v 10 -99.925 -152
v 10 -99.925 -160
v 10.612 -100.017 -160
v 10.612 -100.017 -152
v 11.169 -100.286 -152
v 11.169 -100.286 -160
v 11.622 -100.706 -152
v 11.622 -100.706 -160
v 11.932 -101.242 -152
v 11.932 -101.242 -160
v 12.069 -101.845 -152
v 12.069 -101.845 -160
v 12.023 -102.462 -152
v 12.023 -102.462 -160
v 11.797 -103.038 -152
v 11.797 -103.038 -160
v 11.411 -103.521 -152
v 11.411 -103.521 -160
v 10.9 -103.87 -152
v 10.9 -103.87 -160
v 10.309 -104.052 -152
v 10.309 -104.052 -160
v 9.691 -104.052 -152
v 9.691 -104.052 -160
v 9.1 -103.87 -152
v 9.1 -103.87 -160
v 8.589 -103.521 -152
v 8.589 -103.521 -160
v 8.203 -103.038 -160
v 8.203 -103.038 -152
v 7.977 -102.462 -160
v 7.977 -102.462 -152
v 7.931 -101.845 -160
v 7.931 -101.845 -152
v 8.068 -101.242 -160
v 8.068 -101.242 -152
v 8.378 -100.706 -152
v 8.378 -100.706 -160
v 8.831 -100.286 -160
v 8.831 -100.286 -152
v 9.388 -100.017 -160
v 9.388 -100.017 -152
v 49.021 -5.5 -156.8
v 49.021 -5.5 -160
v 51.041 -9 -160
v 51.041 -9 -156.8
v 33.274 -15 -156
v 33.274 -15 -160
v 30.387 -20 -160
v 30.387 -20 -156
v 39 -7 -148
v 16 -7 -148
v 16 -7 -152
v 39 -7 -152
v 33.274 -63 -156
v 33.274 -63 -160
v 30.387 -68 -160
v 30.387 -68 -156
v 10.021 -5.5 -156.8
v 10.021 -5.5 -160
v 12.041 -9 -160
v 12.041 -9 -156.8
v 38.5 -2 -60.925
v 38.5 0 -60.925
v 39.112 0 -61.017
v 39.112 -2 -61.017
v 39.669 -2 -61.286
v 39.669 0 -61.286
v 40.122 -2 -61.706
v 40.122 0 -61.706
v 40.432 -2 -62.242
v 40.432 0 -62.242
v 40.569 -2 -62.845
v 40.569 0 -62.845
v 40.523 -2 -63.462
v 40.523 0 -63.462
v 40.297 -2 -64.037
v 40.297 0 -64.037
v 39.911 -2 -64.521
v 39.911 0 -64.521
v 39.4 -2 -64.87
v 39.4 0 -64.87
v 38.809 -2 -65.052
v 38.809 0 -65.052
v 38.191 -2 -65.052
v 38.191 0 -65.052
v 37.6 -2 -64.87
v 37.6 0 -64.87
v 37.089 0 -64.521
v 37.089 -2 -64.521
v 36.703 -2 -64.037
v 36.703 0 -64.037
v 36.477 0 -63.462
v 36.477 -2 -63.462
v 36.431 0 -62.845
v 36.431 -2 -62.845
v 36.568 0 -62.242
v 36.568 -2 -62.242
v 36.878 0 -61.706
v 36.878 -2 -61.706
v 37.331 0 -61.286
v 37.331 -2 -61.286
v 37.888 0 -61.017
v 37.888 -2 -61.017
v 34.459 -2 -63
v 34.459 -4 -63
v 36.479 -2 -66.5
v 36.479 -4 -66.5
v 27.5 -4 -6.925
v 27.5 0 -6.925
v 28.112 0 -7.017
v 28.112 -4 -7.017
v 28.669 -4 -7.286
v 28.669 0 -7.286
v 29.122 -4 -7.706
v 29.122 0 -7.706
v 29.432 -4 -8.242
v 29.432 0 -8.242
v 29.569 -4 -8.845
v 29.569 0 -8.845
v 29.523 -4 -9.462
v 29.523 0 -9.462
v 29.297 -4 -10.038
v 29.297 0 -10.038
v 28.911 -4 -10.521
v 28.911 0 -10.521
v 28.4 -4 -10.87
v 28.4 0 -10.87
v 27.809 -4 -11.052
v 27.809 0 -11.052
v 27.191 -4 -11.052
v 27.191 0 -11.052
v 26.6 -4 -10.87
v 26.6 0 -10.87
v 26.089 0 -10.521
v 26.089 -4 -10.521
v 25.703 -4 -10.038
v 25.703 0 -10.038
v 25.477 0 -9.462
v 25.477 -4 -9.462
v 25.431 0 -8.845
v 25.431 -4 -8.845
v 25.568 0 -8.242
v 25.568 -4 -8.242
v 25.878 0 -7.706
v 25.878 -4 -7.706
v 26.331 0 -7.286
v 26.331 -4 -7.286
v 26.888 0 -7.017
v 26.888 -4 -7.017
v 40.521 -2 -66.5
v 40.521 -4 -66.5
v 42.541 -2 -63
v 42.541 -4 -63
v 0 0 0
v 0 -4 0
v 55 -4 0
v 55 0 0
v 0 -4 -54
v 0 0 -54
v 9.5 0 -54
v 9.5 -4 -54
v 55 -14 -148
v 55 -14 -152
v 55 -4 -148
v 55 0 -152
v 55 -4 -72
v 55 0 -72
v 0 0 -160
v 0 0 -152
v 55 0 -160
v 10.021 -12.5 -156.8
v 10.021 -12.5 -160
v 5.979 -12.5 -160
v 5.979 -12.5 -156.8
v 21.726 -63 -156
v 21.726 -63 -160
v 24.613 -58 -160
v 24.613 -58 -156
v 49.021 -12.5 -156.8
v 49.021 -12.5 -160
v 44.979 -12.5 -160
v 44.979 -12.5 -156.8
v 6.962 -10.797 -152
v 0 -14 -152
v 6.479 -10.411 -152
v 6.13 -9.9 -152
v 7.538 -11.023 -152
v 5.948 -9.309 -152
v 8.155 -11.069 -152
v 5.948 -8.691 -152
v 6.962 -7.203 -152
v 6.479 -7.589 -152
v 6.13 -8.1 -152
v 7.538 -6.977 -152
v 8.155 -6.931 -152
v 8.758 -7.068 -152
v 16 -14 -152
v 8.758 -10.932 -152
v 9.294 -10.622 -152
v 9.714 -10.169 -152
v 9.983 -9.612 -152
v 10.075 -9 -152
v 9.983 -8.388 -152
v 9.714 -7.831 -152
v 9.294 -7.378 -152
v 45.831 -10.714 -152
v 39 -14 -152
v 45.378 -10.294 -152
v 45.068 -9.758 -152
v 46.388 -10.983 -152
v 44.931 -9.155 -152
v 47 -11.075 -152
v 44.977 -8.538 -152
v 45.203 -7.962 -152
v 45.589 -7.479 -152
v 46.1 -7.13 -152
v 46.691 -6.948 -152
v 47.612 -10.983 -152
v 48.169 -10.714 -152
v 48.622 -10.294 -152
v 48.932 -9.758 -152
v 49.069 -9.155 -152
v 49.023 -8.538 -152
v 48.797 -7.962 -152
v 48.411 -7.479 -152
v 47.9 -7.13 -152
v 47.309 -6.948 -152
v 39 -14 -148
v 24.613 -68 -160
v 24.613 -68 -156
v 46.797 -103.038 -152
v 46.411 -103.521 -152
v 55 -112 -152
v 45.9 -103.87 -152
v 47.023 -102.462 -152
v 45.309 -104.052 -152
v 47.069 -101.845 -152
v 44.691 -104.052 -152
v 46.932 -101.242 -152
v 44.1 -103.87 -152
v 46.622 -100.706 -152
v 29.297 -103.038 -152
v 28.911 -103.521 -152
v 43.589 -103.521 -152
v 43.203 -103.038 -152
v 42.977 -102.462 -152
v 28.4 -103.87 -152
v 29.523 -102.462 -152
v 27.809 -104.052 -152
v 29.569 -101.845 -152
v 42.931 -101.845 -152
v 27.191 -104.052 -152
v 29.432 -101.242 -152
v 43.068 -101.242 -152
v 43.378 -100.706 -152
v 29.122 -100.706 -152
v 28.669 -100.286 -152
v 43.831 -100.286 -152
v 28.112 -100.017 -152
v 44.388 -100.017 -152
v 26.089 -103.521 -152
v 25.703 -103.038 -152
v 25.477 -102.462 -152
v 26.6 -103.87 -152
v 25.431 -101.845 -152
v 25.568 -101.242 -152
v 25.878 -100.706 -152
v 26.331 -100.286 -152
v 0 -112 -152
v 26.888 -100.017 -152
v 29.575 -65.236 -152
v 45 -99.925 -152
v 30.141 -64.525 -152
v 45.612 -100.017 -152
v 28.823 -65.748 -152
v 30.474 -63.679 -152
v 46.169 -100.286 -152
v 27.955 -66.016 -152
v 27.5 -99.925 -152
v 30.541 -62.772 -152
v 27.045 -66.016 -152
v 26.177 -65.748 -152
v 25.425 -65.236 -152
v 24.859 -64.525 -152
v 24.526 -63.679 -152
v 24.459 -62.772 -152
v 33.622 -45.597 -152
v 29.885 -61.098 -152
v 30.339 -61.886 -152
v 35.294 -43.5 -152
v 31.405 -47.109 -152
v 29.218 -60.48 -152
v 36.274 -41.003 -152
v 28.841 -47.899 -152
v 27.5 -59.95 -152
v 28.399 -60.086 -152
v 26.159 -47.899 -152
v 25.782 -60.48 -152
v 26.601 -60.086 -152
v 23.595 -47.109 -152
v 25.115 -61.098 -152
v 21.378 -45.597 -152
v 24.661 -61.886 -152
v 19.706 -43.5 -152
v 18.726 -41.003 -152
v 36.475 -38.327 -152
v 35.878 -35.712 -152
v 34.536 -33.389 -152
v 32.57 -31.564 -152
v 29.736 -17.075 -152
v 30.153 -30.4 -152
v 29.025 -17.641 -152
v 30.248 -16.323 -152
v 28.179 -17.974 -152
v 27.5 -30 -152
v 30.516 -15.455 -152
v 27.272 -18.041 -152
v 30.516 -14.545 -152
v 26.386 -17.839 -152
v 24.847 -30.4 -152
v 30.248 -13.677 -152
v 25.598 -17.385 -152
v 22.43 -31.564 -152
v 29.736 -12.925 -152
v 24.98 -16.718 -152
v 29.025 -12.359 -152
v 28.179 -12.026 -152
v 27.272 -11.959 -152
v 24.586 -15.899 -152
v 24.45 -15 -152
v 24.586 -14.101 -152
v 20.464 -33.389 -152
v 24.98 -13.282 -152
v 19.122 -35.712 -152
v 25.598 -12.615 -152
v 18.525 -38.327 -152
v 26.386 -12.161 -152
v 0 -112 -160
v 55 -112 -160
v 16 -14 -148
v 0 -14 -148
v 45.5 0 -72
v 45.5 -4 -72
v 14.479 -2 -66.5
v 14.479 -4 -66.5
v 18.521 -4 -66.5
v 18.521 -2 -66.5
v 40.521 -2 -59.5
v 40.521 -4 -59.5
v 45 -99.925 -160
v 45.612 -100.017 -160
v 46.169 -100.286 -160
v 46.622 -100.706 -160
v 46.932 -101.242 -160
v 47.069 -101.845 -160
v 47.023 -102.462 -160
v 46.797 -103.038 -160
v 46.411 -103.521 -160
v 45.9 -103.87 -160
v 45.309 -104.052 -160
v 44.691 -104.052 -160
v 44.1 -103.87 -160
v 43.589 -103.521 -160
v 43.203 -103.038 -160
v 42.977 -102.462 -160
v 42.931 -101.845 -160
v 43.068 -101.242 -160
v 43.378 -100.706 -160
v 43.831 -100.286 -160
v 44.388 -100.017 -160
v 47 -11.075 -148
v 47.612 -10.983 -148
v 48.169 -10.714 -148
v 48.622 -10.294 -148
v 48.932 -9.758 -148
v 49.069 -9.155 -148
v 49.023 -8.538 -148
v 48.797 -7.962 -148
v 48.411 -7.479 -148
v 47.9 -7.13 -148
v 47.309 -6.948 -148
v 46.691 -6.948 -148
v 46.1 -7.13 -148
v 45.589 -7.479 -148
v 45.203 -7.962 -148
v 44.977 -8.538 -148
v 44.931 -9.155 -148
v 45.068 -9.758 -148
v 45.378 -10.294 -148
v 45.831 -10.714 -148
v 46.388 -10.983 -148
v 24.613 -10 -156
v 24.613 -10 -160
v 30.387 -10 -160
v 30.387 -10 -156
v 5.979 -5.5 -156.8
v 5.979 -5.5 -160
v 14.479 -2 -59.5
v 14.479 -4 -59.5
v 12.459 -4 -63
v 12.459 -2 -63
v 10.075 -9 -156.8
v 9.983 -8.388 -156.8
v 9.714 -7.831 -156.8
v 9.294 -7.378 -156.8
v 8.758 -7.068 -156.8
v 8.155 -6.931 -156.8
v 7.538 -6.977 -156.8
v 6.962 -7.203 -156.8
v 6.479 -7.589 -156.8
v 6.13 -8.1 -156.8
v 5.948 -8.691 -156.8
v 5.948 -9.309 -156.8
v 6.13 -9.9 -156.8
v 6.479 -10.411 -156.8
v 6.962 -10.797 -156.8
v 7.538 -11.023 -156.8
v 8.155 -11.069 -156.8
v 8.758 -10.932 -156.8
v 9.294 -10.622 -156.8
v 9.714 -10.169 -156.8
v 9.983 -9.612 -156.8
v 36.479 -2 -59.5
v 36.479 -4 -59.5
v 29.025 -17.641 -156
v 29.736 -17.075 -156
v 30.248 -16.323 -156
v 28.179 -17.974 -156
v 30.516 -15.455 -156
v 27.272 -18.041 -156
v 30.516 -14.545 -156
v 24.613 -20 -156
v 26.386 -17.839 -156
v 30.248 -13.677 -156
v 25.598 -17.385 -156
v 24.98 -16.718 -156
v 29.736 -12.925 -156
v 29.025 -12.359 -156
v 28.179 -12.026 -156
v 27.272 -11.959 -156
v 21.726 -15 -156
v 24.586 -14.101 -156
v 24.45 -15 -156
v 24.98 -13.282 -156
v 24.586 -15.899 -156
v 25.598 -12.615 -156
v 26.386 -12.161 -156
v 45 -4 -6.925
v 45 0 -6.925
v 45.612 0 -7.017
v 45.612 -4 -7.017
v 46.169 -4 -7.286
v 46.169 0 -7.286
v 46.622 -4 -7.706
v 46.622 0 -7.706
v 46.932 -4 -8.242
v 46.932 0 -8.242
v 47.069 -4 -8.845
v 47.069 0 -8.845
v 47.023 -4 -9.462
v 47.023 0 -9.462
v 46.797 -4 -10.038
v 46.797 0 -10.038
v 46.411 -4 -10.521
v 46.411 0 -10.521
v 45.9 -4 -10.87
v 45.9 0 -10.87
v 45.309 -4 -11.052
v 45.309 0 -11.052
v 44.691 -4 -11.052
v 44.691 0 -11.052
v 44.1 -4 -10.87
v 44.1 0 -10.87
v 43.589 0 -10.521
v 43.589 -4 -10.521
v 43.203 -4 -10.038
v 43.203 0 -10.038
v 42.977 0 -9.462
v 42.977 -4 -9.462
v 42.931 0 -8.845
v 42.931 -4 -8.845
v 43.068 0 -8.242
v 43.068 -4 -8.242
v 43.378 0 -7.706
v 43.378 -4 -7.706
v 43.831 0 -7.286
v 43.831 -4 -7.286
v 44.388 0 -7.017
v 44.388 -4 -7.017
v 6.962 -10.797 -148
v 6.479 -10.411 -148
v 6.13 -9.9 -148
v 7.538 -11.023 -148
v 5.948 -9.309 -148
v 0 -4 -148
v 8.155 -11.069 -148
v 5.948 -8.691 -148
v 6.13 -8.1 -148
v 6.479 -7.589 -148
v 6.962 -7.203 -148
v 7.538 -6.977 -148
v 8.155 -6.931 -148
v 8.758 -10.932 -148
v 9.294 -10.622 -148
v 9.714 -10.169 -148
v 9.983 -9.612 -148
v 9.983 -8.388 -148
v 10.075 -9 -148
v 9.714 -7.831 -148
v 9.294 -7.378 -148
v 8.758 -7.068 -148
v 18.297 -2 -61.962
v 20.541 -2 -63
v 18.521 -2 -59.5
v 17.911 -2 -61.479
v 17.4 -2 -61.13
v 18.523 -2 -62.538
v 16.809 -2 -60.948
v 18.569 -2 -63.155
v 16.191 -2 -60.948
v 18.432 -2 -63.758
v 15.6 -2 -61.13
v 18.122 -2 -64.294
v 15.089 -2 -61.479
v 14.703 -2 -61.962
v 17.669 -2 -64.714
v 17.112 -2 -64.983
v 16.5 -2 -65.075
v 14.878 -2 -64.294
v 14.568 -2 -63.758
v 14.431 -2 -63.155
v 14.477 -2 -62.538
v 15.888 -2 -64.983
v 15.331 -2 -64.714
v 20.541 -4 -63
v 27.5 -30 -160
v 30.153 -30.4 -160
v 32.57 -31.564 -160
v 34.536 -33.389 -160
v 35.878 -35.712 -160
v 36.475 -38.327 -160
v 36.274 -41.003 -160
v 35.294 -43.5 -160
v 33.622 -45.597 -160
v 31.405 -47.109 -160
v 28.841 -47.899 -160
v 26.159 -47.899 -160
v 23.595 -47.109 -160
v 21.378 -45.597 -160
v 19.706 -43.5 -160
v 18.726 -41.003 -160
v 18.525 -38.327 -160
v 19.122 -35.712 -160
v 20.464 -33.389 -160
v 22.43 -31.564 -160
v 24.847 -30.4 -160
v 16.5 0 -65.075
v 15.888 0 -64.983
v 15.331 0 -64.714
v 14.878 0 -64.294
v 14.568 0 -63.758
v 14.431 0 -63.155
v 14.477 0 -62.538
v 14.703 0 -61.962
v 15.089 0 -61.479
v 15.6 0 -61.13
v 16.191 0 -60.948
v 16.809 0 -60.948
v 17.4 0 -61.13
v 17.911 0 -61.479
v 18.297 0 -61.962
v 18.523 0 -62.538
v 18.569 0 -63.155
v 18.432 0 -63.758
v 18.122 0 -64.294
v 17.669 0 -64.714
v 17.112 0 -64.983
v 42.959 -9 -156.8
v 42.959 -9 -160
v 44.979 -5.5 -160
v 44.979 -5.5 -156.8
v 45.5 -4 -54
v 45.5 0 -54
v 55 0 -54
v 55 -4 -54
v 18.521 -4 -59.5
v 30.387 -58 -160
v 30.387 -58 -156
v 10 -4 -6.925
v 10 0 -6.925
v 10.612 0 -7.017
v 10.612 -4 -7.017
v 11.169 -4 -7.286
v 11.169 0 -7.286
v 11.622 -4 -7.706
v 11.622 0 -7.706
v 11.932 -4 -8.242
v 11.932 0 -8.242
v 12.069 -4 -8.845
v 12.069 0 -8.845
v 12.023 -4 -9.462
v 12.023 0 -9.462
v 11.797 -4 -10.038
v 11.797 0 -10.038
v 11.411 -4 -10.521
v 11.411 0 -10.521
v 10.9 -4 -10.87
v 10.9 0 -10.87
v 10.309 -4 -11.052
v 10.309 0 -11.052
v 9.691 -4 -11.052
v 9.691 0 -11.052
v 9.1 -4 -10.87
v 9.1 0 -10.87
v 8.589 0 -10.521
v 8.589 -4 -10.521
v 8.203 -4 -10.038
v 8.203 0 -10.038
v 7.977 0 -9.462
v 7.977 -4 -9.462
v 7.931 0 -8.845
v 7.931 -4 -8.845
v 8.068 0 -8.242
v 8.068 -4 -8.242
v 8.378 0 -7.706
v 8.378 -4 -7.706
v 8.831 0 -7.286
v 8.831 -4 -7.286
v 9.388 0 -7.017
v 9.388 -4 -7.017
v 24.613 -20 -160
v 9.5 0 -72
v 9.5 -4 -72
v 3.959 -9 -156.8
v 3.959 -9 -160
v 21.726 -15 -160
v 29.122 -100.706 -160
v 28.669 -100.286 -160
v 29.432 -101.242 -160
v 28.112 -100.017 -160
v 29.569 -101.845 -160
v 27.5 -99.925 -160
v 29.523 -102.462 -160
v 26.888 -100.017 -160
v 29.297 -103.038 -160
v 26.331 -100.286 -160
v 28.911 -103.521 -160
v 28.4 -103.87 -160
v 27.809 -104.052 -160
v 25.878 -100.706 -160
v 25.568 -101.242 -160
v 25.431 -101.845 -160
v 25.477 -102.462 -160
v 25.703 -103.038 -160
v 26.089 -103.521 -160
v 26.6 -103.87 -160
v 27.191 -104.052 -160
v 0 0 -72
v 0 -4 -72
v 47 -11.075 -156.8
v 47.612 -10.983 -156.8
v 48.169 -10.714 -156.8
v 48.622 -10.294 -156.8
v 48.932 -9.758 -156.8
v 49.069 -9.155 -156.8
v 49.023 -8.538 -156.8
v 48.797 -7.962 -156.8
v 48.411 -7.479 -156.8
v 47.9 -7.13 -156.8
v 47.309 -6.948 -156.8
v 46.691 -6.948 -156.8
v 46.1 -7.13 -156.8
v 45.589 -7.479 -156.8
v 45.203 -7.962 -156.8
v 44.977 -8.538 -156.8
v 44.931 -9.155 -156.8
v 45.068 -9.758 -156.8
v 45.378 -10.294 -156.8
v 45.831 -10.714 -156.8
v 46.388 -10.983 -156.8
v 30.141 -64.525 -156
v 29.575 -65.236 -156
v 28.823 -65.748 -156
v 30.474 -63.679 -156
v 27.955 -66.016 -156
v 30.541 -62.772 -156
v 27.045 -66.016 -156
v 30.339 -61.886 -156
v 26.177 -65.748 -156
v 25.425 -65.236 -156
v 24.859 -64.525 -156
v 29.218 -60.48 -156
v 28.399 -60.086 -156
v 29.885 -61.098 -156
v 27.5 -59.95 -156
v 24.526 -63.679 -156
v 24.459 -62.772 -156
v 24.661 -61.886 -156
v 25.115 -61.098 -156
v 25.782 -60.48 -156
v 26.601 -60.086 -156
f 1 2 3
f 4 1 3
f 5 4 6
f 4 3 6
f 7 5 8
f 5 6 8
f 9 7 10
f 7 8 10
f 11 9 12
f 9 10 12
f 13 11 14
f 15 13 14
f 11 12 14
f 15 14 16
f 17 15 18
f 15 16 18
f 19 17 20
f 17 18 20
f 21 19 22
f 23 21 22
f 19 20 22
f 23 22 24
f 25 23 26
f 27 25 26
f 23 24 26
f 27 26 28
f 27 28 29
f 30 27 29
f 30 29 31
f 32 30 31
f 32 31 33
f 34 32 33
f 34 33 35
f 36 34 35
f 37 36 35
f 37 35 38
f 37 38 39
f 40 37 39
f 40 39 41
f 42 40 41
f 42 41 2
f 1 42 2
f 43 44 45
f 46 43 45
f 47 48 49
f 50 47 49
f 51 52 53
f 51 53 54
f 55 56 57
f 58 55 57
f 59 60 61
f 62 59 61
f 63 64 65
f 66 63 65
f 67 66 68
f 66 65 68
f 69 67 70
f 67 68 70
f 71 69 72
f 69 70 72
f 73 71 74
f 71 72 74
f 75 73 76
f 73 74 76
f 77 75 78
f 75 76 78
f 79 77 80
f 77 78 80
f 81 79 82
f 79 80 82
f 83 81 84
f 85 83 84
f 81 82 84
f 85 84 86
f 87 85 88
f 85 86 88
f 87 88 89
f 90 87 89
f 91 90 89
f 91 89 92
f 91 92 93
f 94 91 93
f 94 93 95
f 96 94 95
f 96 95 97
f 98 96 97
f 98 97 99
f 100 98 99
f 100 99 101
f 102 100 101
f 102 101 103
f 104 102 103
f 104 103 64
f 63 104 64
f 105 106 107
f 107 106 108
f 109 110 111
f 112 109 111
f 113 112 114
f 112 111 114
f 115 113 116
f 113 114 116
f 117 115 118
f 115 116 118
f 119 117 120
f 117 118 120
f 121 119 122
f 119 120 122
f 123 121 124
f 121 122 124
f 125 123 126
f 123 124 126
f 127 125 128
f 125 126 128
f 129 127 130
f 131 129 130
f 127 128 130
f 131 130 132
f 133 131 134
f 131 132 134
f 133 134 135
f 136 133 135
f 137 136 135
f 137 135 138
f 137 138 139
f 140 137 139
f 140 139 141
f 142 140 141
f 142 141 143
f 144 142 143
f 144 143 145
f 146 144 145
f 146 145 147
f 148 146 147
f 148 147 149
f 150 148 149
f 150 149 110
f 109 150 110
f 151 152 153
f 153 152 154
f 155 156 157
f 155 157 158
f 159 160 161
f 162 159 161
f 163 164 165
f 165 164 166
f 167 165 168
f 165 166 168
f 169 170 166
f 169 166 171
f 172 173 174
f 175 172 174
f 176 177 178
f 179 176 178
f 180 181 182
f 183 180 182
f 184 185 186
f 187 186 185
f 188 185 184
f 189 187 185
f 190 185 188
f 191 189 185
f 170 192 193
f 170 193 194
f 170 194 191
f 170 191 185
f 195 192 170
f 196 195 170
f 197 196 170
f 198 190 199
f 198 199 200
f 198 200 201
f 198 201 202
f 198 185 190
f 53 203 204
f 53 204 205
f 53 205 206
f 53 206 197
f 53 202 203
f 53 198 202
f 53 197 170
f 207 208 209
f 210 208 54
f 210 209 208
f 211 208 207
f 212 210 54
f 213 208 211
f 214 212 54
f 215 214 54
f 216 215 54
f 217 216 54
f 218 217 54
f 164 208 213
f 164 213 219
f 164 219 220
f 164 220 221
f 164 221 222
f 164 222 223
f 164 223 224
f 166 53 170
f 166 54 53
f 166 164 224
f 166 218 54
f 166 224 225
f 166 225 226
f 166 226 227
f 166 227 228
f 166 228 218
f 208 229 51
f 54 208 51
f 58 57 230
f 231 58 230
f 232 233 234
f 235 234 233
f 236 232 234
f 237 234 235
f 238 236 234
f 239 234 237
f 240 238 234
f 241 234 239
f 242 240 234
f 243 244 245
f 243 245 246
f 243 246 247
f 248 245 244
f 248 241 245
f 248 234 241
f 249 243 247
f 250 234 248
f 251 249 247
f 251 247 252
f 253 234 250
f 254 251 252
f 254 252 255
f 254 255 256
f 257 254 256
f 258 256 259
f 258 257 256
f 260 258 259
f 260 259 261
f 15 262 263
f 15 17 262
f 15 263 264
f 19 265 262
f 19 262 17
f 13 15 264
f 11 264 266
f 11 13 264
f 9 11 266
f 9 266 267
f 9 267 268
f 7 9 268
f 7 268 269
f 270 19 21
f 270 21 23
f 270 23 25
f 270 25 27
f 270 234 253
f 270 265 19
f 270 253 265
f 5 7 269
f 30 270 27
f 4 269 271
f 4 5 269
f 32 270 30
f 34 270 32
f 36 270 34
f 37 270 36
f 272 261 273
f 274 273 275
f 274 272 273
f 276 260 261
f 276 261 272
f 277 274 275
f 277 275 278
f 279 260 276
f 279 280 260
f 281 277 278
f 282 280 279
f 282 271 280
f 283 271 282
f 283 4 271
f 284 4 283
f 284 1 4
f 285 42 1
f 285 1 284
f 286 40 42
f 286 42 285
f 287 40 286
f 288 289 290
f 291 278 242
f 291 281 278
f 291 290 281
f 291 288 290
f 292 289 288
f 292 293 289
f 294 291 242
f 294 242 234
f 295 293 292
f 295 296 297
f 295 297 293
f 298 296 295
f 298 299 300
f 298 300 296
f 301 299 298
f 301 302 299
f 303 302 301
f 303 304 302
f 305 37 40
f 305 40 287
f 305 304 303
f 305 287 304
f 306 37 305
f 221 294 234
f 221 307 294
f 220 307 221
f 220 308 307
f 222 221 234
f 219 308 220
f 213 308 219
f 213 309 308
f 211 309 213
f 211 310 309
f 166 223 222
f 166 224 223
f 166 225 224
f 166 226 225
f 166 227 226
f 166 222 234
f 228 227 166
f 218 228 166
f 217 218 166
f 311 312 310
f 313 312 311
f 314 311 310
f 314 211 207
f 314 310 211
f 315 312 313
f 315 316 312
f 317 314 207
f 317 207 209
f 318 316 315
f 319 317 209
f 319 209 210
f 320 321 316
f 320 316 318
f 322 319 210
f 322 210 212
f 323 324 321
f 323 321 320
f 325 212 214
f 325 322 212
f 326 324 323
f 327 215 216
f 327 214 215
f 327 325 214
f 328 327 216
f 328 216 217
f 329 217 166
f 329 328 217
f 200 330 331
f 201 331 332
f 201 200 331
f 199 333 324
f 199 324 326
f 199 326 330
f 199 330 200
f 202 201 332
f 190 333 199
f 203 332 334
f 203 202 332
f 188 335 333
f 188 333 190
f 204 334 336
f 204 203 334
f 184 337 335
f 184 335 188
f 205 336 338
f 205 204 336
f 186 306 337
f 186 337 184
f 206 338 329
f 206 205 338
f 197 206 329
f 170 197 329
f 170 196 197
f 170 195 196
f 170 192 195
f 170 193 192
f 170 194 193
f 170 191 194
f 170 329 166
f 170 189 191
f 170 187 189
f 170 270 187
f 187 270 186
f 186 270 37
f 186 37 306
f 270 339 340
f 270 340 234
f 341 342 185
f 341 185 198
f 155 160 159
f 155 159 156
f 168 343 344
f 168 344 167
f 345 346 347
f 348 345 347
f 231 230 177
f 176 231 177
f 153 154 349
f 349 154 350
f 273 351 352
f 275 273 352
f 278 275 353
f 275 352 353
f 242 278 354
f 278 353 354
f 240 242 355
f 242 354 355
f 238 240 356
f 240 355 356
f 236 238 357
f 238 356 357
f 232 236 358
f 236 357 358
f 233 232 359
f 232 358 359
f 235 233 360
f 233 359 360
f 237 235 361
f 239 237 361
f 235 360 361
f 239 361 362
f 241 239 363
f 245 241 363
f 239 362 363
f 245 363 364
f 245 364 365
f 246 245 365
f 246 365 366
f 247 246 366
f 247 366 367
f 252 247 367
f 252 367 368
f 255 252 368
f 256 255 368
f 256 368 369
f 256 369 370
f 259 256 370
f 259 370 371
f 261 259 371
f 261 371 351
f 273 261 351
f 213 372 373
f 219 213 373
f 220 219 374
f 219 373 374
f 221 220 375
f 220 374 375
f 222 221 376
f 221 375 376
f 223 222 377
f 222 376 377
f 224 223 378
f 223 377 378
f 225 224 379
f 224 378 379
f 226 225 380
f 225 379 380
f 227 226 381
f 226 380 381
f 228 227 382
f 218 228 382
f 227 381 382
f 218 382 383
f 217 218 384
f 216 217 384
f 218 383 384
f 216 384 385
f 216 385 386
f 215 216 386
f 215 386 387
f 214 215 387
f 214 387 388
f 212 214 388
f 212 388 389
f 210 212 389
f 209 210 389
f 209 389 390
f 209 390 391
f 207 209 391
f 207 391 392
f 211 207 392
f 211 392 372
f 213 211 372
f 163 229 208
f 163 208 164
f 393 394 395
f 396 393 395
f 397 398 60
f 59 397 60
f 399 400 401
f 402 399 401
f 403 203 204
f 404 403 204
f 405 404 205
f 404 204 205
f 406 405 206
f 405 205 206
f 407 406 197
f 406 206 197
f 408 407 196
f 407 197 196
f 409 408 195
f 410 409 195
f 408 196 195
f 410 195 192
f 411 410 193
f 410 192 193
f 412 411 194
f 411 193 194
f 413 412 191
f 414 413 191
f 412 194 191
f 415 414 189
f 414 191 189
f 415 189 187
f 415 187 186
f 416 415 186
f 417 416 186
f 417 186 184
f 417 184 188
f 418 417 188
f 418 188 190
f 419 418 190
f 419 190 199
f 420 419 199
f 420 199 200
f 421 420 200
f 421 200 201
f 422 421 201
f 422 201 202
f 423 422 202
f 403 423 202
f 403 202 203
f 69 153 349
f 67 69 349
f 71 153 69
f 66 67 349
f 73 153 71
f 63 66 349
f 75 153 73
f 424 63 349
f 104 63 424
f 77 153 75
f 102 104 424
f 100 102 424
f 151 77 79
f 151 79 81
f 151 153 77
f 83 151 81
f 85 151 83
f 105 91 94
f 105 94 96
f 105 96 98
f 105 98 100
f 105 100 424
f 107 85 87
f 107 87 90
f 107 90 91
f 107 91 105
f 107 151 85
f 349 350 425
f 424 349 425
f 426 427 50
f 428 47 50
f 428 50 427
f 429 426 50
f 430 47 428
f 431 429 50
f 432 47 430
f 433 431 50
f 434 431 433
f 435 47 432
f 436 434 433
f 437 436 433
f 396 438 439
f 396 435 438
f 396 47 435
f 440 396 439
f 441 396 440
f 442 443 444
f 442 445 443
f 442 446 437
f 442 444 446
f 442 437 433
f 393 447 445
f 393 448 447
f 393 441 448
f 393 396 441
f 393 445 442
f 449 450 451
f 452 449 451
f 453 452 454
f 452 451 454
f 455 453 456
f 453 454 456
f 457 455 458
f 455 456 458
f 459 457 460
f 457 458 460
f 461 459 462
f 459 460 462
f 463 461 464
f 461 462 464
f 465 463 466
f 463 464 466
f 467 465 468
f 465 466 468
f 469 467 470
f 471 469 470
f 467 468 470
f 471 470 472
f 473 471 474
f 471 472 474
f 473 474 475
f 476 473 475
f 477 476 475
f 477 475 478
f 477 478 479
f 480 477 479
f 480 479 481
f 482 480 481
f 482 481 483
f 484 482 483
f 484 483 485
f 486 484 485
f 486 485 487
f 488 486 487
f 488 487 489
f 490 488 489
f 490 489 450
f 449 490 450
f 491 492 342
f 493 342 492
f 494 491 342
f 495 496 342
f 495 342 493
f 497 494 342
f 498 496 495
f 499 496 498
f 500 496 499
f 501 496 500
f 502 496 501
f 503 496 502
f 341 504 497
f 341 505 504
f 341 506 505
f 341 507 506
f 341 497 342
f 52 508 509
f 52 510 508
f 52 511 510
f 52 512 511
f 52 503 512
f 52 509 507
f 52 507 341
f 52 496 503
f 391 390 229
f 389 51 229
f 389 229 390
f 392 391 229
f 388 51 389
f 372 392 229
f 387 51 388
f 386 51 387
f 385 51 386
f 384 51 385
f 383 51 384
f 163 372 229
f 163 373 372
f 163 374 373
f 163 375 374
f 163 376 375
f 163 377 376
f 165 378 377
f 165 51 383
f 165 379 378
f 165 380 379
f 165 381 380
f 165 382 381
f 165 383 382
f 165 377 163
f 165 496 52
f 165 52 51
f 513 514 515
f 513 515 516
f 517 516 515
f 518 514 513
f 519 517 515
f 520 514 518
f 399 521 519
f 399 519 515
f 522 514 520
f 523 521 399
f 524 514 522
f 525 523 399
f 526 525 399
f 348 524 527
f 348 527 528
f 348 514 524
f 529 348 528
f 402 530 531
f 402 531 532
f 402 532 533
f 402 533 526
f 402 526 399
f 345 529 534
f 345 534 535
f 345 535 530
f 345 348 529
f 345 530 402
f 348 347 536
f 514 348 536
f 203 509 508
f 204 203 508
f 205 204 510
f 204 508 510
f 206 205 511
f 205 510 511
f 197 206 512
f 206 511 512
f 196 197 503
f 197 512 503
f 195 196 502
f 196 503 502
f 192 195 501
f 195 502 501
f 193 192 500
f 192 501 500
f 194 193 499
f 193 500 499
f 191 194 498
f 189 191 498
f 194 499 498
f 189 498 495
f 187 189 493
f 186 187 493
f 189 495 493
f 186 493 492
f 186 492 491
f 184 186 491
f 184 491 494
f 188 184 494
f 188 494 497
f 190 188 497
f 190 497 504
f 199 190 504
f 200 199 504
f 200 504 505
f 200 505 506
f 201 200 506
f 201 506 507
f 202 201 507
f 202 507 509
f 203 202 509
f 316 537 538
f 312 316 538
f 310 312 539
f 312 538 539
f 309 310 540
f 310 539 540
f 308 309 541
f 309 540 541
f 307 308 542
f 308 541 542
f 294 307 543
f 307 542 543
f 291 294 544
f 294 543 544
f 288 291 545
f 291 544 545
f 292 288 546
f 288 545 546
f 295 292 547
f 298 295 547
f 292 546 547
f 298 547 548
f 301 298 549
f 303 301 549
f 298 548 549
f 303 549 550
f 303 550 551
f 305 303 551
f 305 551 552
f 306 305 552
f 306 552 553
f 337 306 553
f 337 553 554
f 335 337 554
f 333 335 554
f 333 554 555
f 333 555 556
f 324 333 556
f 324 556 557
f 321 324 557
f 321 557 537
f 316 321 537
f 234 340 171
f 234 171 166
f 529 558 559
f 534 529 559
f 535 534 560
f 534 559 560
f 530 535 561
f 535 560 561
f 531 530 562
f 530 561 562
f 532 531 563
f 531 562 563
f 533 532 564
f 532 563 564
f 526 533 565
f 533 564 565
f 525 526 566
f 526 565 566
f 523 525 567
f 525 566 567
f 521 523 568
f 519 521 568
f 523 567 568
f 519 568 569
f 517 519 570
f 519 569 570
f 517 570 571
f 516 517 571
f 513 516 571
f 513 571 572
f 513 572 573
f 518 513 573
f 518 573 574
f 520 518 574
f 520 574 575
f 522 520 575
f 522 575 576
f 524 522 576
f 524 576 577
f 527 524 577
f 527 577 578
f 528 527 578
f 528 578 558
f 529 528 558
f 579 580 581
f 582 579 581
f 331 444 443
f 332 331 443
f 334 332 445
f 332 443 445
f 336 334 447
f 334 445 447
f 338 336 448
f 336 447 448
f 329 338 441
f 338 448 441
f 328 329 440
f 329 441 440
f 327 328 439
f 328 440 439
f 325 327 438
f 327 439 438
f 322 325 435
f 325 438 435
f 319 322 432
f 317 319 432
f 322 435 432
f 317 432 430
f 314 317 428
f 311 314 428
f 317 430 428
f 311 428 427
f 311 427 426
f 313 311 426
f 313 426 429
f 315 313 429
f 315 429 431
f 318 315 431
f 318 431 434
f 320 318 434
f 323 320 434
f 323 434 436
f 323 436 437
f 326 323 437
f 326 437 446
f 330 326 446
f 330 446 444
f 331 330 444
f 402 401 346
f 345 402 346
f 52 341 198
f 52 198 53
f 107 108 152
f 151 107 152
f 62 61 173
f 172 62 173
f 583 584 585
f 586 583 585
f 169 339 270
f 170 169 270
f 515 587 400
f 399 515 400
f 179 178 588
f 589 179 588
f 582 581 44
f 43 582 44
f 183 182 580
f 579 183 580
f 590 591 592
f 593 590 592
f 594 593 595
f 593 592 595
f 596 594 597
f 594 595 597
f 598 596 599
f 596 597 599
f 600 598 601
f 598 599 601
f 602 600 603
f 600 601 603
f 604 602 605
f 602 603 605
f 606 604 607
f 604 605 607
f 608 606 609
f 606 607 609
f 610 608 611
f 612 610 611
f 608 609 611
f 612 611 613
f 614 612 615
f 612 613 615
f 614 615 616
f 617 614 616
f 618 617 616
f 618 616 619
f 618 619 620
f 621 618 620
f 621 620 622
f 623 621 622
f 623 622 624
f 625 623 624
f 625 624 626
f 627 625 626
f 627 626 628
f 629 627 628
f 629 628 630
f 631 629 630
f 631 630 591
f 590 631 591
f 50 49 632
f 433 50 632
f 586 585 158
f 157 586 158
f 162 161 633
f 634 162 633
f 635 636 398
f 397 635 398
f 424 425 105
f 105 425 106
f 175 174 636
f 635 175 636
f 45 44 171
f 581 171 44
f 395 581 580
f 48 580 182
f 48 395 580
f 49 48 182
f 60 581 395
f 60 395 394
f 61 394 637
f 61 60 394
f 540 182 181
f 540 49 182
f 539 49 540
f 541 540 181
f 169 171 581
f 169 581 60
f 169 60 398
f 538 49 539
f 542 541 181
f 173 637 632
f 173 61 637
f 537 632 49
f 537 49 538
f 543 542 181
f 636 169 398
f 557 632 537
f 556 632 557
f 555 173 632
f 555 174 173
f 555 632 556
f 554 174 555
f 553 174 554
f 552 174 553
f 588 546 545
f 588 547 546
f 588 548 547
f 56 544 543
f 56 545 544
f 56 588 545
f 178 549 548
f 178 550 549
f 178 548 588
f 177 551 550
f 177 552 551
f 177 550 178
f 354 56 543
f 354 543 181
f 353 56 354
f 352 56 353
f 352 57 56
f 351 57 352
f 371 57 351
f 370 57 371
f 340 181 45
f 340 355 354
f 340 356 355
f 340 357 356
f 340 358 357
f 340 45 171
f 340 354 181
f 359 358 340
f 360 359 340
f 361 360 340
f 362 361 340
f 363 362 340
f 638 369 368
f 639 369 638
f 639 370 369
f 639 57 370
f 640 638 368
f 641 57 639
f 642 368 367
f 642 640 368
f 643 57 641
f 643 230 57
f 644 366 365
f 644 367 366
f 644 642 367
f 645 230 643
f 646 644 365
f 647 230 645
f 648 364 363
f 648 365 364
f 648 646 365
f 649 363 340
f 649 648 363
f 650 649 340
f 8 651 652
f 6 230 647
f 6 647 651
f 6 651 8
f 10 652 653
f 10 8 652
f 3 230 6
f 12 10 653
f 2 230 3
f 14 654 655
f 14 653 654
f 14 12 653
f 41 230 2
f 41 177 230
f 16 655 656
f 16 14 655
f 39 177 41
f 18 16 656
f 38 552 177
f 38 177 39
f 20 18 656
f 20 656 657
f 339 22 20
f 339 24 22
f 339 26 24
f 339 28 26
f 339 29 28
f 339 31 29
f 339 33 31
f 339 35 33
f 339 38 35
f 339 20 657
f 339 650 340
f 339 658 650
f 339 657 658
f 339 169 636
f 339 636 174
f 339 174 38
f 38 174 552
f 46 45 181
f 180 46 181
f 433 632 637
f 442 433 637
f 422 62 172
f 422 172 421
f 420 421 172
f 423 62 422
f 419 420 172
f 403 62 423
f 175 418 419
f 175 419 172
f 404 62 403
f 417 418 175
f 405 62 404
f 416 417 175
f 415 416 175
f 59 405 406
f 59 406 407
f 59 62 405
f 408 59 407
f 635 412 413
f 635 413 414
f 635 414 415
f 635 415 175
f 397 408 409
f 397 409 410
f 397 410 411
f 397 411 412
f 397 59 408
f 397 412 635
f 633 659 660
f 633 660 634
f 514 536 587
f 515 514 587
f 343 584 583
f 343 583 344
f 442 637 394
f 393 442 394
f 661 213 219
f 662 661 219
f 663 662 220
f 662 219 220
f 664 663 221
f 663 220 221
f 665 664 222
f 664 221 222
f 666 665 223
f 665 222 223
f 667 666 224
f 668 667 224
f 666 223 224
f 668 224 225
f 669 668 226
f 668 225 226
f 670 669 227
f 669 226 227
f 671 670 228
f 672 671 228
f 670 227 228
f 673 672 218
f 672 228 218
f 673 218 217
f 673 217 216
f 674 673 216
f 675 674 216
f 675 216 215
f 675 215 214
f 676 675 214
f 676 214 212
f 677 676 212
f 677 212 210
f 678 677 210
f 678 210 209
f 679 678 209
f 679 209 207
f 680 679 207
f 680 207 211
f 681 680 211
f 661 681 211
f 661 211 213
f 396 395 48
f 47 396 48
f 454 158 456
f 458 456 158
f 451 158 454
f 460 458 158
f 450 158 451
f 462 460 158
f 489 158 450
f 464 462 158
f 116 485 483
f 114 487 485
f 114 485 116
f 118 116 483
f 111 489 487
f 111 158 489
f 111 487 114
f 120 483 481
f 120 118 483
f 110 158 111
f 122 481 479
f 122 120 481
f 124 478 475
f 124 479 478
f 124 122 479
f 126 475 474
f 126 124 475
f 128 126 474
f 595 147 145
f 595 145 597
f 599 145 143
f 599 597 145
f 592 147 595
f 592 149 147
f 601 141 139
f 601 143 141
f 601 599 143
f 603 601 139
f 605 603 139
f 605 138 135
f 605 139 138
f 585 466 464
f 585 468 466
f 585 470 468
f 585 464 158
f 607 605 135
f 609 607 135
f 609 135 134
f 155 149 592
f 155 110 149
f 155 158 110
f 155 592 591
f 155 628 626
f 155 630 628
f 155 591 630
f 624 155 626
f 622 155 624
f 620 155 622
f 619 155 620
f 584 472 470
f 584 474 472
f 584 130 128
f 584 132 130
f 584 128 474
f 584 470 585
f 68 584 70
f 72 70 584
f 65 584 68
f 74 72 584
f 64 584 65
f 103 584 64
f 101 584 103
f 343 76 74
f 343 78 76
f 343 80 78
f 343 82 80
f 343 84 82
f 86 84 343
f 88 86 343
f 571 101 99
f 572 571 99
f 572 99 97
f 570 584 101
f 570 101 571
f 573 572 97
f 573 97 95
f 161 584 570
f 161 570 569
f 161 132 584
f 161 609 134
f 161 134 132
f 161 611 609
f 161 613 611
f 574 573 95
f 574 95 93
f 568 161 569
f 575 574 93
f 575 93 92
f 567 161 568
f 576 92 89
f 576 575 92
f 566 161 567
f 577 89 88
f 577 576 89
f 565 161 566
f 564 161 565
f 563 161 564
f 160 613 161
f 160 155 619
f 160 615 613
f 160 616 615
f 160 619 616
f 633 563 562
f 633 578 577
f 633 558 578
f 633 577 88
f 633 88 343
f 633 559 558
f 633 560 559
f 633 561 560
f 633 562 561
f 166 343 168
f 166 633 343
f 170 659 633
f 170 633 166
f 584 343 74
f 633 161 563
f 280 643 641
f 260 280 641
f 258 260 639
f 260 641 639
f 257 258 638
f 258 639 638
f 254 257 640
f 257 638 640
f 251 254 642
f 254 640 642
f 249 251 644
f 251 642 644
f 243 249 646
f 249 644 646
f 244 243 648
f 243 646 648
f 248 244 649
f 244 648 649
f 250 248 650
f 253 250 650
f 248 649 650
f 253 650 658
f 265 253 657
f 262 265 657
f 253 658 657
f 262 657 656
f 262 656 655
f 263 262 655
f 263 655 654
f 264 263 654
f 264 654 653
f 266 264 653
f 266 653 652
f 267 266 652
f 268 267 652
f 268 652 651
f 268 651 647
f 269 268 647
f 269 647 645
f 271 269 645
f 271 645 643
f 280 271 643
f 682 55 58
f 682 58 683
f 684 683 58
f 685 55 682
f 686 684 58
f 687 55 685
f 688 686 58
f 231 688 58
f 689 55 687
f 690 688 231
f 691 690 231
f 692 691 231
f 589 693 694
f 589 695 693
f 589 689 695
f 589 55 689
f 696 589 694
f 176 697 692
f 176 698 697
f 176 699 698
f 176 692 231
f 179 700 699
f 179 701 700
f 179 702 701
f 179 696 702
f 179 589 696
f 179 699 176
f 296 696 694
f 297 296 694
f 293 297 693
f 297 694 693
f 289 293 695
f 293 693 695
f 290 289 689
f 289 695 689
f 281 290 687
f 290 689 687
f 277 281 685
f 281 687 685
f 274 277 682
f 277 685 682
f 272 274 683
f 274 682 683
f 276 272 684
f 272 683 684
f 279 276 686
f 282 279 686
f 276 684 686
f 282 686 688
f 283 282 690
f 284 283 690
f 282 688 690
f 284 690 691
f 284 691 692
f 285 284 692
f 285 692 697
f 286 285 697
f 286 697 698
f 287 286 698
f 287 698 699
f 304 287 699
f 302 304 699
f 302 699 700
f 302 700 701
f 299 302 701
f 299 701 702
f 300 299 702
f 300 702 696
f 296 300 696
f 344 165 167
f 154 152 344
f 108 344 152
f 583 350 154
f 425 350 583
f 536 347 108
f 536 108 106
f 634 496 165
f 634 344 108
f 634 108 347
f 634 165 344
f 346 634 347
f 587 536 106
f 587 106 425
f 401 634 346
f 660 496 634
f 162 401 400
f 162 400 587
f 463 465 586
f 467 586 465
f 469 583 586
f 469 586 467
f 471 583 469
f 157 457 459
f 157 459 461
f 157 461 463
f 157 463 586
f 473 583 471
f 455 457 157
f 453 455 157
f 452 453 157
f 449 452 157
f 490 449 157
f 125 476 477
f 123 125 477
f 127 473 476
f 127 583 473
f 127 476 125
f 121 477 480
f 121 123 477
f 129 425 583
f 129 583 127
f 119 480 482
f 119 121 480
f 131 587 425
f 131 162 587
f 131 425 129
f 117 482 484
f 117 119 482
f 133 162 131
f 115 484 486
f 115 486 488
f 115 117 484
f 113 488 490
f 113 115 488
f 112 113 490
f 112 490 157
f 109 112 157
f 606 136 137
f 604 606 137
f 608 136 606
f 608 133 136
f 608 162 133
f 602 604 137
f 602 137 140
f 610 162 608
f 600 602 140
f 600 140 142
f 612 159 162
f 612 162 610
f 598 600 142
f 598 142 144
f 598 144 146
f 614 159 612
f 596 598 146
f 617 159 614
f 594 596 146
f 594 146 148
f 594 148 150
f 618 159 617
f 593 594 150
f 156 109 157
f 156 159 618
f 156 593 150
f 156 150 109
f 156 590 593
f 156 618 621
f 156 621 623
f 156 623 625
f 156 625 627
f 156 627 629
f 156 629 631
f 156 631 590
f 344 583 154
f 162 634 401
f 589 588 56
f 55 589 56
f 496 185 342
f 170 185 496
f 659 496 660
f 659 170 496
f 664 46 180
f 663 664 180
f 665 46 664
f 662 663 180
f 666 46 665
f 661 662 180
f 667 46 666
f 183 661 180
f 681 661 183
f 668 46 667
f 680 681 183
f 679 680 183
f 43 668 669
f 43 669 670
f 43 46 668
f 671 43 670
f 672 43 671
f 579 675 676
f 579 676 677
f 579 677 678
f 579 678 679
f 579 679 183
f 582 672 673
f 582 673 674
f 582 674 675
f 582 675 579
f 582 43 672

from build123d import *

# Parameters (mm, degrees)
BOSS_EXTRUDE1_DEPTH    = 55
CUT_EXTRUDE1_REACH     = 204.901
SKETCH2_R              = 9
SKETCH2_R_2            = 3.05
CUT_EXTRUDE2_DEPTH     = 4
SKETCH4_R              = 2.075
CUT_EXTRUDE3_DEPTH     = 4
CUT_EXTRUDE5_DEPTH     = 2
CUT_EXTRUDE6_REACH     = 204.901
SKETCH8_W              = 9.5
SKETCH8_H              = 18
CUT_EXTRUDE7_REACH     = 204.901
SKETCH9_R              = 2.075
CUT_EXTRUDE8_REACH     = 204.901
SKETCH10_R             = 2.075
SKETCH12_W             = 55
SKETCH12_H             = 4
BOSS_EXTRUDE2_DEPTH    = 10
SKETCH13_W             = 23
SKETCH13_H             = 7
CUT_EXTRUDE9_DEPTH     = 4
CUT_EXTRUDE10_REACH    = 195.579
SKETCH14_R             = 2.075
CUT_EXTRUDE11_DEPTH    = 3.2
SPLIT1_SURFACE_1_BACK  = 203.901
SPLIT1_SURFACE_1_DEPTH = 407.802
SPLIT1_SURFACE_2_BACK  = 203.901
SPLIT1_SURFACE_2_DEPTH = 407.802


with BuildPart() as part:
    # Sketch1 → Boss-Extrude1 (new body)
    with BuildSketch(Plane(origin=(0, 0, 0), x_dir=(0, 0, -1), z_dir=(1, 0, 0))):
        Polygon((0, 0), (160, 0), (160, -112), (152, -112), (152, -4), (0, -4), align=None)
    extrude(amount=BOSS_EXTRUDE1_DEPTH)

    # Sketch2 → Cut-Extrude1 (cut, up to next)
    with BuildSketch(Plane(origin=(0, 0, -160), x_dir=(-1, 0, 0), z_dir=(0, 0, -1)), mode=Mode.PRIVATE) as cut_extrude1_sk1:
        with Locations(Location((-27.5, -39, 0), (0, 0, 90))):
            Circle(SKETCH2_R)
    cut_extrude1_tool1 = extrude(cut_extrude1_sk1.sketch, amount=-CUT_EXTRUDE1_REACH, mode=Mode.PRIVATE) & part.part
    # Sketch2 → Cut-Extrude1 (cut, up to next)
    with BuildSketch(Plane(origin=(0, 0, -160), x_dir=(-1, 0, 0), z_dir=(0, 0, -1)), mode=Mode.PRIVATE) as cut_extrude1_sk2:
        with Locations(Location((-27.5, -63, 0), (0, 0, 90))):
            Circle(SKETCH2_R_2)
    cut_extrude1_tool2 = extrude(cut_extrude1_sk2.sketch, amount=-CUT_EXTRUDE1_REACH, mode=Mode.PRIVATE) & part.part
    # Sketch2 → Cut-Extrude1 (cut, up to next)
    with BuildSketch(Plane(origin=(0, 0, -160), x_dir=(-1, 0, 0), z_dir=(0, 0, -1)), mode=Mode.PRIVATE) as cut_extrude1_sk3:
        with Locations((-27.5, -15)):
            Circle(SKETCH2_R_2)
    cut_extrude1_tool3 = extrude(cut_extrude1_sk3.sketch, amount=-CUT_EXTRUDE1_REACH, mode=Mode.PRIVATE) & part.part
    add(cut_extrude1_tool1.solids().sort_by_distance((27.5, -39, -160))[0], mode=Mode.SUBTRACT)
    add(cut_extrude1_tool2.solids().sort_by_distance((27.5, -63, -160))[0], mode=Mode.SUBTRACT)
    add(cut_extrude1_tool3.solids().sort_by_distance((27.5, -15, -160))[0], mode=Mode.SUBTRACT)

    # Sketch3 → Cut-Extrude2 (cut)
    with BuildSketch(Plane(origin=(0, 0, -160), x_dir=(-1, 0, 0), z_dir=(0, 0, -1))):
        Polygon((-21.726497308, -15), (-24.613248654, -10), (-30.386751346, -10), (-33.273502692, -15), (-30.386751346, -20), (-24.613248654, -20), align=None)
        Polygon((-24.613248654, -68), (-21.726497308, -63), (-24.613248654, -58), (-30.386751346, -58), (-33.273502692, -63), (-30.386751346, -68), align=None)
    extrude(amount=-CUT_EXTRUDE2_DEPTH, mode=Mode.SUBTRACT)

    # Sketch4 → Cut-Extrude3 (cut)
    with BuildSketch(Plane(origin=(0, 0, 0), x_dir=(1, 0, 0), z_dir=(0, 1, 0))):
        with Locations(Location((38.5, 63, 0), (0, 0, 270))):
            Circle(SKETCH4_R)
        with Locations(Location((16.5, 63, 0), (0, 0, 90))):
            Circle(SKETCH4_R)
    extrude(amount=-CUT_EXTRUDE3_DEPTH, mode=Mode.SUBTRACT)

    # Sketch7 → Cut-Extrude5 (cut)
    with BuildSketch(Plane(origin=(0, -4, 0), x_dir=(-1, 0, 0), z_dir=(0, -1, 0))):
        Polygon((-18.520725942, 66.5), (-20.541451884, 63), (-18.520725942, 59.5), (-14.479274058, 59.5), (-12.458548116, 63), (-14.479274058, 66.5), align=None)
        Polygon((-42.541451884, 63), (-40.520725942, 59.5), (-36.479274058, 59.5), (-34.458548116, 63), (-36.479274058, 66.5), (-40.520725942, 66.5), align=None)
    extrude(amount=-CUT_EXTRUDE5_DEPTH, mode=Mode.SUBTRACT)

    # Sketch8 → Cut-Extrude6 (cut, up to next)
    with BuildSketch(Plane(origin=(0, 0, 0), x_dir=(1, 0, 0), z_dir=(0, 1, 0)), mode=Mode.PRIVATE) as cut_extrude6_sk1:
        with Locations((4.75, 63)):
            Rectangle(SKETCH8_W, SKETCH8_H)
    cut_extrude6_tool1 = extrude(cut_extrude6_sk1.sketch, amount=-CUT_EXTRUDE6_REACH, mode=Mode.PRIVATE) & part.part
    # Sketch8 → Cut-Extrude6 (cut, up to next)
    with BuildSketch(Plane(origin=(0, 0, 0), x_dir=(1, 0, 0), z_dir=(0, 1, 0)), mode=Mode.PRIVATE) as cut_extrude6_sk2:
        with Locations((50.25, 63)):
            Rectangle(SKETCH8_W, SKETCH8_H)
    cut_extrude6_tool2 = extrude(cut_extrude6_sk2.sketch, amount=-CUT_EXTRUDE6_REACH, mode=Mode.PRIVATE) & part.part
    add(cut_extrude6_tool1.solids().sort_by_distance((4.75, 0, -63))[0], mode=Mode.SUBTRACT)
    add(cut_extrude6_tool2.solids().sort_by_distance((50.25, 0, -63))[0], mode=Mode.SUBTRACT)

    # Sketch9 → Cut-Extrude7 (cut, up to next)
    with BuildSketch(Plane(origin=(0, 0, -160), x_dir=(-1, 0, 0), z_dir=(0, 0, -1)), mode=Mode.PRIVATE) as cut_extrude7_sk1:
        with Locations(Location((-45, -102, 0), (0, 0, 90))):
            Circle(SKETCH9_R)
    cut_extrude7_tool1 = extrude(cut_extrude7_sk1.sketch, amount=-CUT_EXTRUDE7_REACH, mode=Mode.PRIVATE) & part.part
    # Sketch9 → Cut-Extrude7 (cut, up to next)
    with BuildSketch(Plane(origin=(0, 0, -160), x_dir=(-1, 0, 0), z_dir=(0, 0, -1)), mode=Mode.PRIVATE) as cut_extrude7_sk2:
        with Locations(Location((-27.5, -102, 0), (0, 0, 90))):
            Circle(SKETCH9_R)
    cut_extrude7_tool2 = extrude(cut_extrude7_sk2.sketch, amount=-CUT_EXTRUDE7_REACH, mode=Mode.PRIVATE) & part.part
    # Sketch9 → Cut-Extrude7 (cut, up to next)
    with BuildSketch(Plane(origin=(0, 0, -160), x_dir=(-1, 0, 0), z_dir=(0, 0, -1)), mode=Mode.PRIVATE) as cut_extrude7_sk3:
        with Locations(Location((-10, -102, 0), (0, 0, 90))):
            Circle(SKETCH9_R)
    cut_extrude7_tool3 = extrude(cut_extrude7_sk3.sketch, amount=-CUT_EXTRUDE7_REACH, mode=Mode.PRIVATE) & part.part
    add(cut_extrude7_tool1.solids().sort_by_distance((45, -102, -160))[0], mode=Mode.SUBTRACT)
    add(cut_extrude7_tool2.solids().sort_by_distance((27.5, -102, -160))[0], mode=Mode.SUBTRACT)
    add(cut_extrude7_tool3.solids().sort_by_distance((10, -102, -160))[0], mode=Mode.SUBTRACT)

    # Sketch10 → Cut-Extrude8 (cut, up to next)
    with BuildSketch(Plane(origin=(0, 0, 0), x_dir=(1, 0, 0), z_dir=(0, 1, 0)), mode=Mode.PRIVATE) as cut_extrude8_sk1:
        with Locations(Location((10, 9, 0), (0, 0, 270))):
            Circle(SKETCH10_R)
    cut_extrude8_tool1 = extrude(cut_extrude8_sk1.sketch, amount=-CUT_EXTRUDE8_REACH, mode=Mode.PRIVATE) & part.part
    # Sketch10 → Cut-Extrude8 (cut, up to next)
    with BuildSketch(Plane(origin=(0, 0, 0), x_dir=(1, 0, 0), z_dir=(0, 1, 0)), mode=Mode.PRIVATE) as cut_extrude8_sk2:
        with Locations(Location((27.5, 9, 0), (0, 0, 270))):
            Circle(SKETCH10_R)
    cut_extrude8_tool2 = extrude(cut_extrude8_sk2.sketch, amount=-CUT_EXTRUDE8_REACH, mode=Mode.PRIVATE) & part.part
    # Sketch10 → Cut-Extrude8 (cut, up to next)
    with BuildSketch(Plane(origin=(0, 0, 0), x_dir=(1, 0, 0), z_dir=(0, 1, 0)), mode=Mode.PRIVATE) as cut_extrude8_sk3:
        with Locations(Location((45, 9, 0), (0, 0, 270))):
            Circle(SKETCH10_R)
    cut_extrude8_tool3 = extrude(cut_extrude8_sk3.sketch, amount=-CUT_EXTRUDE8_REACH, mode=Mode.PRIVATE) & part.part
    add(cut_extrude8_tool1.solids().sort_by_distance((10, 0, -9))[0], mode=Mode.SUBTRACT)
    add(cut_extrude8_tool2.solids().sort_by_distance((27.5, 0, -9))[0], mode=Mode.SUBTRACT)
    add(cut_extrude8_tool3.solids().sort_by_distance((45, 0, -9))[0], mode=Mode.SUBTRACT)

    # Sketch12 → Boss-Extrude2 (add)
    with BuildSketch(Plane.XZ.offset(4)):
        with Locations((27.5, -150)):
            Rectangle(SKETCH12_W, SKETCH12_H)
    extrude(amount=BOSS_EXTRUDE2_DEPTH)

    # Sketch13 → Cut-Extrude9 (cut)
    with BuildSketch(Plane.XY.offset(-148)):
        with Locations((27.5, -10.5)):
            Rectangle(SKETCH13_W, SKETCH13_H)
    extrude(amount=-CUT_EXTRUDE9_DEPTH, mode=Mode.SUBTRACT)

    # Sketch14 → Cut-Extrude10 (cut, up to next)
    with BuildSketch(Plane.XY.offset(-148), mode=Mode.PRIVATE) as cut_extrude10_sk1:
        with Locations((8, -9)):
            Circle(SKETCH14_R)
    cut_extrude10_tool1 = extrude(cut_extrude10_sk1.sketch, amount=-CUT_EXTRUDE10_REACH, mode=Mode.PRIVATE) & part.part
    # Sketch14 → Cut-Extrude10 (cut, up to next)
    with BuildSketch(Plane.XY.offset(-148), mode=Mode.PRIVATE) as cut_extrude10_sk2:
        with Locations(Location((47, -9, 0), (0, 0, 270))):
            Circle(SKETCH14_R)
    cut_extrude10_tool2 = extrude(cut_extrude10_sk2.sketch, amount=-CUT_EXTRUDE10_REACH, mode=Mode.PRIVATE) & part.part
    add(cut_extrude10_tool1.solids().sort_by_distance((8, -9, -148))[0], mode=Mode.SUBTRACT)
    add(cut_extrude10_tool2.solids().sort_by_distance((47, -9, -148))[0], mode=Mode.SUBTRACT)

    # Sketch15 → Cut-Extrude11 (cut)
    with BuildSketch(Plane(origin=(0, 0, -160), x_dir=(-1, 0, 0), z_dir=(0, 0, -1))):
        Polygon((-42.958548116, -9), (-44.979274058, -5.5), (-49.020725942, -5.5), (-51.041451884, -9), (-49.020725942, -12.5), (-44.979274058, -12.5), align=None)
        Polygon((-3.958548116, -9), (-5.979274058, -5.5), (-10.020725942, -5.5), (-12.041451884, -9), (-10.020725942, -12.5), (-5.979274058, -12.5), align=None)
    extrude(amount=-CUT_EXTRUDE11_DEPTH, mode=Mode.SUBTRACT)


with BuildPart() as body_2:
    # Split1: the piece behind the surface
    add(part.part)
    # Split1 surface: a surface, the sketch's curves swept straight by 407.802 mm
    with BuildLine(Plane.ZY.offset(-SPLIT1_SURFACE_1_BACK), mode=Mode.PRIVATE) as split1_surface_1_path:
        Line((-152, -14), (-152, 0))
    split1_surface_1 = Shell.extrude(split1_surface_1_path.wire(), (-1 * SPLIT1_SURFACE_1_DEPTH, 0 * SPLIT1_SURFACE_1_DEPTH, 0 * SPLIT1_SURFACE_1_DEPTH))
    split(bisect_by=split1_surface_1, keep=Keep.BOTTOM)


with BuildPart() as part_1:
    add(part.part)

    # Split1: split by a surface, the side it looks to stays
    # Split1 surface: a surface, the sketch's curves swept straight by 407.802 mm
    with BuildLine(Plane.ZY.offset(-SPLIT1_SURFACE_2_BACK), mode=Mode.PRIVATE) as split1_surface_2_path:
        Line((-152, -14), (-152, 0))
    split1_surface_2 = Shell.extrude(split1_surface_2_path.wire(), (-1 * SPLIT1_SURFACE_2_DEPTH, 0 * SPLIT1_SURFACE_2_DEPTH, 0 * SPLIT1_SURFACE_2_DEPTH))
    split(bisect_by=split1_surface_2, keep=Keep.TOP)


solid = Compound([body_2.part, part_1.part])
